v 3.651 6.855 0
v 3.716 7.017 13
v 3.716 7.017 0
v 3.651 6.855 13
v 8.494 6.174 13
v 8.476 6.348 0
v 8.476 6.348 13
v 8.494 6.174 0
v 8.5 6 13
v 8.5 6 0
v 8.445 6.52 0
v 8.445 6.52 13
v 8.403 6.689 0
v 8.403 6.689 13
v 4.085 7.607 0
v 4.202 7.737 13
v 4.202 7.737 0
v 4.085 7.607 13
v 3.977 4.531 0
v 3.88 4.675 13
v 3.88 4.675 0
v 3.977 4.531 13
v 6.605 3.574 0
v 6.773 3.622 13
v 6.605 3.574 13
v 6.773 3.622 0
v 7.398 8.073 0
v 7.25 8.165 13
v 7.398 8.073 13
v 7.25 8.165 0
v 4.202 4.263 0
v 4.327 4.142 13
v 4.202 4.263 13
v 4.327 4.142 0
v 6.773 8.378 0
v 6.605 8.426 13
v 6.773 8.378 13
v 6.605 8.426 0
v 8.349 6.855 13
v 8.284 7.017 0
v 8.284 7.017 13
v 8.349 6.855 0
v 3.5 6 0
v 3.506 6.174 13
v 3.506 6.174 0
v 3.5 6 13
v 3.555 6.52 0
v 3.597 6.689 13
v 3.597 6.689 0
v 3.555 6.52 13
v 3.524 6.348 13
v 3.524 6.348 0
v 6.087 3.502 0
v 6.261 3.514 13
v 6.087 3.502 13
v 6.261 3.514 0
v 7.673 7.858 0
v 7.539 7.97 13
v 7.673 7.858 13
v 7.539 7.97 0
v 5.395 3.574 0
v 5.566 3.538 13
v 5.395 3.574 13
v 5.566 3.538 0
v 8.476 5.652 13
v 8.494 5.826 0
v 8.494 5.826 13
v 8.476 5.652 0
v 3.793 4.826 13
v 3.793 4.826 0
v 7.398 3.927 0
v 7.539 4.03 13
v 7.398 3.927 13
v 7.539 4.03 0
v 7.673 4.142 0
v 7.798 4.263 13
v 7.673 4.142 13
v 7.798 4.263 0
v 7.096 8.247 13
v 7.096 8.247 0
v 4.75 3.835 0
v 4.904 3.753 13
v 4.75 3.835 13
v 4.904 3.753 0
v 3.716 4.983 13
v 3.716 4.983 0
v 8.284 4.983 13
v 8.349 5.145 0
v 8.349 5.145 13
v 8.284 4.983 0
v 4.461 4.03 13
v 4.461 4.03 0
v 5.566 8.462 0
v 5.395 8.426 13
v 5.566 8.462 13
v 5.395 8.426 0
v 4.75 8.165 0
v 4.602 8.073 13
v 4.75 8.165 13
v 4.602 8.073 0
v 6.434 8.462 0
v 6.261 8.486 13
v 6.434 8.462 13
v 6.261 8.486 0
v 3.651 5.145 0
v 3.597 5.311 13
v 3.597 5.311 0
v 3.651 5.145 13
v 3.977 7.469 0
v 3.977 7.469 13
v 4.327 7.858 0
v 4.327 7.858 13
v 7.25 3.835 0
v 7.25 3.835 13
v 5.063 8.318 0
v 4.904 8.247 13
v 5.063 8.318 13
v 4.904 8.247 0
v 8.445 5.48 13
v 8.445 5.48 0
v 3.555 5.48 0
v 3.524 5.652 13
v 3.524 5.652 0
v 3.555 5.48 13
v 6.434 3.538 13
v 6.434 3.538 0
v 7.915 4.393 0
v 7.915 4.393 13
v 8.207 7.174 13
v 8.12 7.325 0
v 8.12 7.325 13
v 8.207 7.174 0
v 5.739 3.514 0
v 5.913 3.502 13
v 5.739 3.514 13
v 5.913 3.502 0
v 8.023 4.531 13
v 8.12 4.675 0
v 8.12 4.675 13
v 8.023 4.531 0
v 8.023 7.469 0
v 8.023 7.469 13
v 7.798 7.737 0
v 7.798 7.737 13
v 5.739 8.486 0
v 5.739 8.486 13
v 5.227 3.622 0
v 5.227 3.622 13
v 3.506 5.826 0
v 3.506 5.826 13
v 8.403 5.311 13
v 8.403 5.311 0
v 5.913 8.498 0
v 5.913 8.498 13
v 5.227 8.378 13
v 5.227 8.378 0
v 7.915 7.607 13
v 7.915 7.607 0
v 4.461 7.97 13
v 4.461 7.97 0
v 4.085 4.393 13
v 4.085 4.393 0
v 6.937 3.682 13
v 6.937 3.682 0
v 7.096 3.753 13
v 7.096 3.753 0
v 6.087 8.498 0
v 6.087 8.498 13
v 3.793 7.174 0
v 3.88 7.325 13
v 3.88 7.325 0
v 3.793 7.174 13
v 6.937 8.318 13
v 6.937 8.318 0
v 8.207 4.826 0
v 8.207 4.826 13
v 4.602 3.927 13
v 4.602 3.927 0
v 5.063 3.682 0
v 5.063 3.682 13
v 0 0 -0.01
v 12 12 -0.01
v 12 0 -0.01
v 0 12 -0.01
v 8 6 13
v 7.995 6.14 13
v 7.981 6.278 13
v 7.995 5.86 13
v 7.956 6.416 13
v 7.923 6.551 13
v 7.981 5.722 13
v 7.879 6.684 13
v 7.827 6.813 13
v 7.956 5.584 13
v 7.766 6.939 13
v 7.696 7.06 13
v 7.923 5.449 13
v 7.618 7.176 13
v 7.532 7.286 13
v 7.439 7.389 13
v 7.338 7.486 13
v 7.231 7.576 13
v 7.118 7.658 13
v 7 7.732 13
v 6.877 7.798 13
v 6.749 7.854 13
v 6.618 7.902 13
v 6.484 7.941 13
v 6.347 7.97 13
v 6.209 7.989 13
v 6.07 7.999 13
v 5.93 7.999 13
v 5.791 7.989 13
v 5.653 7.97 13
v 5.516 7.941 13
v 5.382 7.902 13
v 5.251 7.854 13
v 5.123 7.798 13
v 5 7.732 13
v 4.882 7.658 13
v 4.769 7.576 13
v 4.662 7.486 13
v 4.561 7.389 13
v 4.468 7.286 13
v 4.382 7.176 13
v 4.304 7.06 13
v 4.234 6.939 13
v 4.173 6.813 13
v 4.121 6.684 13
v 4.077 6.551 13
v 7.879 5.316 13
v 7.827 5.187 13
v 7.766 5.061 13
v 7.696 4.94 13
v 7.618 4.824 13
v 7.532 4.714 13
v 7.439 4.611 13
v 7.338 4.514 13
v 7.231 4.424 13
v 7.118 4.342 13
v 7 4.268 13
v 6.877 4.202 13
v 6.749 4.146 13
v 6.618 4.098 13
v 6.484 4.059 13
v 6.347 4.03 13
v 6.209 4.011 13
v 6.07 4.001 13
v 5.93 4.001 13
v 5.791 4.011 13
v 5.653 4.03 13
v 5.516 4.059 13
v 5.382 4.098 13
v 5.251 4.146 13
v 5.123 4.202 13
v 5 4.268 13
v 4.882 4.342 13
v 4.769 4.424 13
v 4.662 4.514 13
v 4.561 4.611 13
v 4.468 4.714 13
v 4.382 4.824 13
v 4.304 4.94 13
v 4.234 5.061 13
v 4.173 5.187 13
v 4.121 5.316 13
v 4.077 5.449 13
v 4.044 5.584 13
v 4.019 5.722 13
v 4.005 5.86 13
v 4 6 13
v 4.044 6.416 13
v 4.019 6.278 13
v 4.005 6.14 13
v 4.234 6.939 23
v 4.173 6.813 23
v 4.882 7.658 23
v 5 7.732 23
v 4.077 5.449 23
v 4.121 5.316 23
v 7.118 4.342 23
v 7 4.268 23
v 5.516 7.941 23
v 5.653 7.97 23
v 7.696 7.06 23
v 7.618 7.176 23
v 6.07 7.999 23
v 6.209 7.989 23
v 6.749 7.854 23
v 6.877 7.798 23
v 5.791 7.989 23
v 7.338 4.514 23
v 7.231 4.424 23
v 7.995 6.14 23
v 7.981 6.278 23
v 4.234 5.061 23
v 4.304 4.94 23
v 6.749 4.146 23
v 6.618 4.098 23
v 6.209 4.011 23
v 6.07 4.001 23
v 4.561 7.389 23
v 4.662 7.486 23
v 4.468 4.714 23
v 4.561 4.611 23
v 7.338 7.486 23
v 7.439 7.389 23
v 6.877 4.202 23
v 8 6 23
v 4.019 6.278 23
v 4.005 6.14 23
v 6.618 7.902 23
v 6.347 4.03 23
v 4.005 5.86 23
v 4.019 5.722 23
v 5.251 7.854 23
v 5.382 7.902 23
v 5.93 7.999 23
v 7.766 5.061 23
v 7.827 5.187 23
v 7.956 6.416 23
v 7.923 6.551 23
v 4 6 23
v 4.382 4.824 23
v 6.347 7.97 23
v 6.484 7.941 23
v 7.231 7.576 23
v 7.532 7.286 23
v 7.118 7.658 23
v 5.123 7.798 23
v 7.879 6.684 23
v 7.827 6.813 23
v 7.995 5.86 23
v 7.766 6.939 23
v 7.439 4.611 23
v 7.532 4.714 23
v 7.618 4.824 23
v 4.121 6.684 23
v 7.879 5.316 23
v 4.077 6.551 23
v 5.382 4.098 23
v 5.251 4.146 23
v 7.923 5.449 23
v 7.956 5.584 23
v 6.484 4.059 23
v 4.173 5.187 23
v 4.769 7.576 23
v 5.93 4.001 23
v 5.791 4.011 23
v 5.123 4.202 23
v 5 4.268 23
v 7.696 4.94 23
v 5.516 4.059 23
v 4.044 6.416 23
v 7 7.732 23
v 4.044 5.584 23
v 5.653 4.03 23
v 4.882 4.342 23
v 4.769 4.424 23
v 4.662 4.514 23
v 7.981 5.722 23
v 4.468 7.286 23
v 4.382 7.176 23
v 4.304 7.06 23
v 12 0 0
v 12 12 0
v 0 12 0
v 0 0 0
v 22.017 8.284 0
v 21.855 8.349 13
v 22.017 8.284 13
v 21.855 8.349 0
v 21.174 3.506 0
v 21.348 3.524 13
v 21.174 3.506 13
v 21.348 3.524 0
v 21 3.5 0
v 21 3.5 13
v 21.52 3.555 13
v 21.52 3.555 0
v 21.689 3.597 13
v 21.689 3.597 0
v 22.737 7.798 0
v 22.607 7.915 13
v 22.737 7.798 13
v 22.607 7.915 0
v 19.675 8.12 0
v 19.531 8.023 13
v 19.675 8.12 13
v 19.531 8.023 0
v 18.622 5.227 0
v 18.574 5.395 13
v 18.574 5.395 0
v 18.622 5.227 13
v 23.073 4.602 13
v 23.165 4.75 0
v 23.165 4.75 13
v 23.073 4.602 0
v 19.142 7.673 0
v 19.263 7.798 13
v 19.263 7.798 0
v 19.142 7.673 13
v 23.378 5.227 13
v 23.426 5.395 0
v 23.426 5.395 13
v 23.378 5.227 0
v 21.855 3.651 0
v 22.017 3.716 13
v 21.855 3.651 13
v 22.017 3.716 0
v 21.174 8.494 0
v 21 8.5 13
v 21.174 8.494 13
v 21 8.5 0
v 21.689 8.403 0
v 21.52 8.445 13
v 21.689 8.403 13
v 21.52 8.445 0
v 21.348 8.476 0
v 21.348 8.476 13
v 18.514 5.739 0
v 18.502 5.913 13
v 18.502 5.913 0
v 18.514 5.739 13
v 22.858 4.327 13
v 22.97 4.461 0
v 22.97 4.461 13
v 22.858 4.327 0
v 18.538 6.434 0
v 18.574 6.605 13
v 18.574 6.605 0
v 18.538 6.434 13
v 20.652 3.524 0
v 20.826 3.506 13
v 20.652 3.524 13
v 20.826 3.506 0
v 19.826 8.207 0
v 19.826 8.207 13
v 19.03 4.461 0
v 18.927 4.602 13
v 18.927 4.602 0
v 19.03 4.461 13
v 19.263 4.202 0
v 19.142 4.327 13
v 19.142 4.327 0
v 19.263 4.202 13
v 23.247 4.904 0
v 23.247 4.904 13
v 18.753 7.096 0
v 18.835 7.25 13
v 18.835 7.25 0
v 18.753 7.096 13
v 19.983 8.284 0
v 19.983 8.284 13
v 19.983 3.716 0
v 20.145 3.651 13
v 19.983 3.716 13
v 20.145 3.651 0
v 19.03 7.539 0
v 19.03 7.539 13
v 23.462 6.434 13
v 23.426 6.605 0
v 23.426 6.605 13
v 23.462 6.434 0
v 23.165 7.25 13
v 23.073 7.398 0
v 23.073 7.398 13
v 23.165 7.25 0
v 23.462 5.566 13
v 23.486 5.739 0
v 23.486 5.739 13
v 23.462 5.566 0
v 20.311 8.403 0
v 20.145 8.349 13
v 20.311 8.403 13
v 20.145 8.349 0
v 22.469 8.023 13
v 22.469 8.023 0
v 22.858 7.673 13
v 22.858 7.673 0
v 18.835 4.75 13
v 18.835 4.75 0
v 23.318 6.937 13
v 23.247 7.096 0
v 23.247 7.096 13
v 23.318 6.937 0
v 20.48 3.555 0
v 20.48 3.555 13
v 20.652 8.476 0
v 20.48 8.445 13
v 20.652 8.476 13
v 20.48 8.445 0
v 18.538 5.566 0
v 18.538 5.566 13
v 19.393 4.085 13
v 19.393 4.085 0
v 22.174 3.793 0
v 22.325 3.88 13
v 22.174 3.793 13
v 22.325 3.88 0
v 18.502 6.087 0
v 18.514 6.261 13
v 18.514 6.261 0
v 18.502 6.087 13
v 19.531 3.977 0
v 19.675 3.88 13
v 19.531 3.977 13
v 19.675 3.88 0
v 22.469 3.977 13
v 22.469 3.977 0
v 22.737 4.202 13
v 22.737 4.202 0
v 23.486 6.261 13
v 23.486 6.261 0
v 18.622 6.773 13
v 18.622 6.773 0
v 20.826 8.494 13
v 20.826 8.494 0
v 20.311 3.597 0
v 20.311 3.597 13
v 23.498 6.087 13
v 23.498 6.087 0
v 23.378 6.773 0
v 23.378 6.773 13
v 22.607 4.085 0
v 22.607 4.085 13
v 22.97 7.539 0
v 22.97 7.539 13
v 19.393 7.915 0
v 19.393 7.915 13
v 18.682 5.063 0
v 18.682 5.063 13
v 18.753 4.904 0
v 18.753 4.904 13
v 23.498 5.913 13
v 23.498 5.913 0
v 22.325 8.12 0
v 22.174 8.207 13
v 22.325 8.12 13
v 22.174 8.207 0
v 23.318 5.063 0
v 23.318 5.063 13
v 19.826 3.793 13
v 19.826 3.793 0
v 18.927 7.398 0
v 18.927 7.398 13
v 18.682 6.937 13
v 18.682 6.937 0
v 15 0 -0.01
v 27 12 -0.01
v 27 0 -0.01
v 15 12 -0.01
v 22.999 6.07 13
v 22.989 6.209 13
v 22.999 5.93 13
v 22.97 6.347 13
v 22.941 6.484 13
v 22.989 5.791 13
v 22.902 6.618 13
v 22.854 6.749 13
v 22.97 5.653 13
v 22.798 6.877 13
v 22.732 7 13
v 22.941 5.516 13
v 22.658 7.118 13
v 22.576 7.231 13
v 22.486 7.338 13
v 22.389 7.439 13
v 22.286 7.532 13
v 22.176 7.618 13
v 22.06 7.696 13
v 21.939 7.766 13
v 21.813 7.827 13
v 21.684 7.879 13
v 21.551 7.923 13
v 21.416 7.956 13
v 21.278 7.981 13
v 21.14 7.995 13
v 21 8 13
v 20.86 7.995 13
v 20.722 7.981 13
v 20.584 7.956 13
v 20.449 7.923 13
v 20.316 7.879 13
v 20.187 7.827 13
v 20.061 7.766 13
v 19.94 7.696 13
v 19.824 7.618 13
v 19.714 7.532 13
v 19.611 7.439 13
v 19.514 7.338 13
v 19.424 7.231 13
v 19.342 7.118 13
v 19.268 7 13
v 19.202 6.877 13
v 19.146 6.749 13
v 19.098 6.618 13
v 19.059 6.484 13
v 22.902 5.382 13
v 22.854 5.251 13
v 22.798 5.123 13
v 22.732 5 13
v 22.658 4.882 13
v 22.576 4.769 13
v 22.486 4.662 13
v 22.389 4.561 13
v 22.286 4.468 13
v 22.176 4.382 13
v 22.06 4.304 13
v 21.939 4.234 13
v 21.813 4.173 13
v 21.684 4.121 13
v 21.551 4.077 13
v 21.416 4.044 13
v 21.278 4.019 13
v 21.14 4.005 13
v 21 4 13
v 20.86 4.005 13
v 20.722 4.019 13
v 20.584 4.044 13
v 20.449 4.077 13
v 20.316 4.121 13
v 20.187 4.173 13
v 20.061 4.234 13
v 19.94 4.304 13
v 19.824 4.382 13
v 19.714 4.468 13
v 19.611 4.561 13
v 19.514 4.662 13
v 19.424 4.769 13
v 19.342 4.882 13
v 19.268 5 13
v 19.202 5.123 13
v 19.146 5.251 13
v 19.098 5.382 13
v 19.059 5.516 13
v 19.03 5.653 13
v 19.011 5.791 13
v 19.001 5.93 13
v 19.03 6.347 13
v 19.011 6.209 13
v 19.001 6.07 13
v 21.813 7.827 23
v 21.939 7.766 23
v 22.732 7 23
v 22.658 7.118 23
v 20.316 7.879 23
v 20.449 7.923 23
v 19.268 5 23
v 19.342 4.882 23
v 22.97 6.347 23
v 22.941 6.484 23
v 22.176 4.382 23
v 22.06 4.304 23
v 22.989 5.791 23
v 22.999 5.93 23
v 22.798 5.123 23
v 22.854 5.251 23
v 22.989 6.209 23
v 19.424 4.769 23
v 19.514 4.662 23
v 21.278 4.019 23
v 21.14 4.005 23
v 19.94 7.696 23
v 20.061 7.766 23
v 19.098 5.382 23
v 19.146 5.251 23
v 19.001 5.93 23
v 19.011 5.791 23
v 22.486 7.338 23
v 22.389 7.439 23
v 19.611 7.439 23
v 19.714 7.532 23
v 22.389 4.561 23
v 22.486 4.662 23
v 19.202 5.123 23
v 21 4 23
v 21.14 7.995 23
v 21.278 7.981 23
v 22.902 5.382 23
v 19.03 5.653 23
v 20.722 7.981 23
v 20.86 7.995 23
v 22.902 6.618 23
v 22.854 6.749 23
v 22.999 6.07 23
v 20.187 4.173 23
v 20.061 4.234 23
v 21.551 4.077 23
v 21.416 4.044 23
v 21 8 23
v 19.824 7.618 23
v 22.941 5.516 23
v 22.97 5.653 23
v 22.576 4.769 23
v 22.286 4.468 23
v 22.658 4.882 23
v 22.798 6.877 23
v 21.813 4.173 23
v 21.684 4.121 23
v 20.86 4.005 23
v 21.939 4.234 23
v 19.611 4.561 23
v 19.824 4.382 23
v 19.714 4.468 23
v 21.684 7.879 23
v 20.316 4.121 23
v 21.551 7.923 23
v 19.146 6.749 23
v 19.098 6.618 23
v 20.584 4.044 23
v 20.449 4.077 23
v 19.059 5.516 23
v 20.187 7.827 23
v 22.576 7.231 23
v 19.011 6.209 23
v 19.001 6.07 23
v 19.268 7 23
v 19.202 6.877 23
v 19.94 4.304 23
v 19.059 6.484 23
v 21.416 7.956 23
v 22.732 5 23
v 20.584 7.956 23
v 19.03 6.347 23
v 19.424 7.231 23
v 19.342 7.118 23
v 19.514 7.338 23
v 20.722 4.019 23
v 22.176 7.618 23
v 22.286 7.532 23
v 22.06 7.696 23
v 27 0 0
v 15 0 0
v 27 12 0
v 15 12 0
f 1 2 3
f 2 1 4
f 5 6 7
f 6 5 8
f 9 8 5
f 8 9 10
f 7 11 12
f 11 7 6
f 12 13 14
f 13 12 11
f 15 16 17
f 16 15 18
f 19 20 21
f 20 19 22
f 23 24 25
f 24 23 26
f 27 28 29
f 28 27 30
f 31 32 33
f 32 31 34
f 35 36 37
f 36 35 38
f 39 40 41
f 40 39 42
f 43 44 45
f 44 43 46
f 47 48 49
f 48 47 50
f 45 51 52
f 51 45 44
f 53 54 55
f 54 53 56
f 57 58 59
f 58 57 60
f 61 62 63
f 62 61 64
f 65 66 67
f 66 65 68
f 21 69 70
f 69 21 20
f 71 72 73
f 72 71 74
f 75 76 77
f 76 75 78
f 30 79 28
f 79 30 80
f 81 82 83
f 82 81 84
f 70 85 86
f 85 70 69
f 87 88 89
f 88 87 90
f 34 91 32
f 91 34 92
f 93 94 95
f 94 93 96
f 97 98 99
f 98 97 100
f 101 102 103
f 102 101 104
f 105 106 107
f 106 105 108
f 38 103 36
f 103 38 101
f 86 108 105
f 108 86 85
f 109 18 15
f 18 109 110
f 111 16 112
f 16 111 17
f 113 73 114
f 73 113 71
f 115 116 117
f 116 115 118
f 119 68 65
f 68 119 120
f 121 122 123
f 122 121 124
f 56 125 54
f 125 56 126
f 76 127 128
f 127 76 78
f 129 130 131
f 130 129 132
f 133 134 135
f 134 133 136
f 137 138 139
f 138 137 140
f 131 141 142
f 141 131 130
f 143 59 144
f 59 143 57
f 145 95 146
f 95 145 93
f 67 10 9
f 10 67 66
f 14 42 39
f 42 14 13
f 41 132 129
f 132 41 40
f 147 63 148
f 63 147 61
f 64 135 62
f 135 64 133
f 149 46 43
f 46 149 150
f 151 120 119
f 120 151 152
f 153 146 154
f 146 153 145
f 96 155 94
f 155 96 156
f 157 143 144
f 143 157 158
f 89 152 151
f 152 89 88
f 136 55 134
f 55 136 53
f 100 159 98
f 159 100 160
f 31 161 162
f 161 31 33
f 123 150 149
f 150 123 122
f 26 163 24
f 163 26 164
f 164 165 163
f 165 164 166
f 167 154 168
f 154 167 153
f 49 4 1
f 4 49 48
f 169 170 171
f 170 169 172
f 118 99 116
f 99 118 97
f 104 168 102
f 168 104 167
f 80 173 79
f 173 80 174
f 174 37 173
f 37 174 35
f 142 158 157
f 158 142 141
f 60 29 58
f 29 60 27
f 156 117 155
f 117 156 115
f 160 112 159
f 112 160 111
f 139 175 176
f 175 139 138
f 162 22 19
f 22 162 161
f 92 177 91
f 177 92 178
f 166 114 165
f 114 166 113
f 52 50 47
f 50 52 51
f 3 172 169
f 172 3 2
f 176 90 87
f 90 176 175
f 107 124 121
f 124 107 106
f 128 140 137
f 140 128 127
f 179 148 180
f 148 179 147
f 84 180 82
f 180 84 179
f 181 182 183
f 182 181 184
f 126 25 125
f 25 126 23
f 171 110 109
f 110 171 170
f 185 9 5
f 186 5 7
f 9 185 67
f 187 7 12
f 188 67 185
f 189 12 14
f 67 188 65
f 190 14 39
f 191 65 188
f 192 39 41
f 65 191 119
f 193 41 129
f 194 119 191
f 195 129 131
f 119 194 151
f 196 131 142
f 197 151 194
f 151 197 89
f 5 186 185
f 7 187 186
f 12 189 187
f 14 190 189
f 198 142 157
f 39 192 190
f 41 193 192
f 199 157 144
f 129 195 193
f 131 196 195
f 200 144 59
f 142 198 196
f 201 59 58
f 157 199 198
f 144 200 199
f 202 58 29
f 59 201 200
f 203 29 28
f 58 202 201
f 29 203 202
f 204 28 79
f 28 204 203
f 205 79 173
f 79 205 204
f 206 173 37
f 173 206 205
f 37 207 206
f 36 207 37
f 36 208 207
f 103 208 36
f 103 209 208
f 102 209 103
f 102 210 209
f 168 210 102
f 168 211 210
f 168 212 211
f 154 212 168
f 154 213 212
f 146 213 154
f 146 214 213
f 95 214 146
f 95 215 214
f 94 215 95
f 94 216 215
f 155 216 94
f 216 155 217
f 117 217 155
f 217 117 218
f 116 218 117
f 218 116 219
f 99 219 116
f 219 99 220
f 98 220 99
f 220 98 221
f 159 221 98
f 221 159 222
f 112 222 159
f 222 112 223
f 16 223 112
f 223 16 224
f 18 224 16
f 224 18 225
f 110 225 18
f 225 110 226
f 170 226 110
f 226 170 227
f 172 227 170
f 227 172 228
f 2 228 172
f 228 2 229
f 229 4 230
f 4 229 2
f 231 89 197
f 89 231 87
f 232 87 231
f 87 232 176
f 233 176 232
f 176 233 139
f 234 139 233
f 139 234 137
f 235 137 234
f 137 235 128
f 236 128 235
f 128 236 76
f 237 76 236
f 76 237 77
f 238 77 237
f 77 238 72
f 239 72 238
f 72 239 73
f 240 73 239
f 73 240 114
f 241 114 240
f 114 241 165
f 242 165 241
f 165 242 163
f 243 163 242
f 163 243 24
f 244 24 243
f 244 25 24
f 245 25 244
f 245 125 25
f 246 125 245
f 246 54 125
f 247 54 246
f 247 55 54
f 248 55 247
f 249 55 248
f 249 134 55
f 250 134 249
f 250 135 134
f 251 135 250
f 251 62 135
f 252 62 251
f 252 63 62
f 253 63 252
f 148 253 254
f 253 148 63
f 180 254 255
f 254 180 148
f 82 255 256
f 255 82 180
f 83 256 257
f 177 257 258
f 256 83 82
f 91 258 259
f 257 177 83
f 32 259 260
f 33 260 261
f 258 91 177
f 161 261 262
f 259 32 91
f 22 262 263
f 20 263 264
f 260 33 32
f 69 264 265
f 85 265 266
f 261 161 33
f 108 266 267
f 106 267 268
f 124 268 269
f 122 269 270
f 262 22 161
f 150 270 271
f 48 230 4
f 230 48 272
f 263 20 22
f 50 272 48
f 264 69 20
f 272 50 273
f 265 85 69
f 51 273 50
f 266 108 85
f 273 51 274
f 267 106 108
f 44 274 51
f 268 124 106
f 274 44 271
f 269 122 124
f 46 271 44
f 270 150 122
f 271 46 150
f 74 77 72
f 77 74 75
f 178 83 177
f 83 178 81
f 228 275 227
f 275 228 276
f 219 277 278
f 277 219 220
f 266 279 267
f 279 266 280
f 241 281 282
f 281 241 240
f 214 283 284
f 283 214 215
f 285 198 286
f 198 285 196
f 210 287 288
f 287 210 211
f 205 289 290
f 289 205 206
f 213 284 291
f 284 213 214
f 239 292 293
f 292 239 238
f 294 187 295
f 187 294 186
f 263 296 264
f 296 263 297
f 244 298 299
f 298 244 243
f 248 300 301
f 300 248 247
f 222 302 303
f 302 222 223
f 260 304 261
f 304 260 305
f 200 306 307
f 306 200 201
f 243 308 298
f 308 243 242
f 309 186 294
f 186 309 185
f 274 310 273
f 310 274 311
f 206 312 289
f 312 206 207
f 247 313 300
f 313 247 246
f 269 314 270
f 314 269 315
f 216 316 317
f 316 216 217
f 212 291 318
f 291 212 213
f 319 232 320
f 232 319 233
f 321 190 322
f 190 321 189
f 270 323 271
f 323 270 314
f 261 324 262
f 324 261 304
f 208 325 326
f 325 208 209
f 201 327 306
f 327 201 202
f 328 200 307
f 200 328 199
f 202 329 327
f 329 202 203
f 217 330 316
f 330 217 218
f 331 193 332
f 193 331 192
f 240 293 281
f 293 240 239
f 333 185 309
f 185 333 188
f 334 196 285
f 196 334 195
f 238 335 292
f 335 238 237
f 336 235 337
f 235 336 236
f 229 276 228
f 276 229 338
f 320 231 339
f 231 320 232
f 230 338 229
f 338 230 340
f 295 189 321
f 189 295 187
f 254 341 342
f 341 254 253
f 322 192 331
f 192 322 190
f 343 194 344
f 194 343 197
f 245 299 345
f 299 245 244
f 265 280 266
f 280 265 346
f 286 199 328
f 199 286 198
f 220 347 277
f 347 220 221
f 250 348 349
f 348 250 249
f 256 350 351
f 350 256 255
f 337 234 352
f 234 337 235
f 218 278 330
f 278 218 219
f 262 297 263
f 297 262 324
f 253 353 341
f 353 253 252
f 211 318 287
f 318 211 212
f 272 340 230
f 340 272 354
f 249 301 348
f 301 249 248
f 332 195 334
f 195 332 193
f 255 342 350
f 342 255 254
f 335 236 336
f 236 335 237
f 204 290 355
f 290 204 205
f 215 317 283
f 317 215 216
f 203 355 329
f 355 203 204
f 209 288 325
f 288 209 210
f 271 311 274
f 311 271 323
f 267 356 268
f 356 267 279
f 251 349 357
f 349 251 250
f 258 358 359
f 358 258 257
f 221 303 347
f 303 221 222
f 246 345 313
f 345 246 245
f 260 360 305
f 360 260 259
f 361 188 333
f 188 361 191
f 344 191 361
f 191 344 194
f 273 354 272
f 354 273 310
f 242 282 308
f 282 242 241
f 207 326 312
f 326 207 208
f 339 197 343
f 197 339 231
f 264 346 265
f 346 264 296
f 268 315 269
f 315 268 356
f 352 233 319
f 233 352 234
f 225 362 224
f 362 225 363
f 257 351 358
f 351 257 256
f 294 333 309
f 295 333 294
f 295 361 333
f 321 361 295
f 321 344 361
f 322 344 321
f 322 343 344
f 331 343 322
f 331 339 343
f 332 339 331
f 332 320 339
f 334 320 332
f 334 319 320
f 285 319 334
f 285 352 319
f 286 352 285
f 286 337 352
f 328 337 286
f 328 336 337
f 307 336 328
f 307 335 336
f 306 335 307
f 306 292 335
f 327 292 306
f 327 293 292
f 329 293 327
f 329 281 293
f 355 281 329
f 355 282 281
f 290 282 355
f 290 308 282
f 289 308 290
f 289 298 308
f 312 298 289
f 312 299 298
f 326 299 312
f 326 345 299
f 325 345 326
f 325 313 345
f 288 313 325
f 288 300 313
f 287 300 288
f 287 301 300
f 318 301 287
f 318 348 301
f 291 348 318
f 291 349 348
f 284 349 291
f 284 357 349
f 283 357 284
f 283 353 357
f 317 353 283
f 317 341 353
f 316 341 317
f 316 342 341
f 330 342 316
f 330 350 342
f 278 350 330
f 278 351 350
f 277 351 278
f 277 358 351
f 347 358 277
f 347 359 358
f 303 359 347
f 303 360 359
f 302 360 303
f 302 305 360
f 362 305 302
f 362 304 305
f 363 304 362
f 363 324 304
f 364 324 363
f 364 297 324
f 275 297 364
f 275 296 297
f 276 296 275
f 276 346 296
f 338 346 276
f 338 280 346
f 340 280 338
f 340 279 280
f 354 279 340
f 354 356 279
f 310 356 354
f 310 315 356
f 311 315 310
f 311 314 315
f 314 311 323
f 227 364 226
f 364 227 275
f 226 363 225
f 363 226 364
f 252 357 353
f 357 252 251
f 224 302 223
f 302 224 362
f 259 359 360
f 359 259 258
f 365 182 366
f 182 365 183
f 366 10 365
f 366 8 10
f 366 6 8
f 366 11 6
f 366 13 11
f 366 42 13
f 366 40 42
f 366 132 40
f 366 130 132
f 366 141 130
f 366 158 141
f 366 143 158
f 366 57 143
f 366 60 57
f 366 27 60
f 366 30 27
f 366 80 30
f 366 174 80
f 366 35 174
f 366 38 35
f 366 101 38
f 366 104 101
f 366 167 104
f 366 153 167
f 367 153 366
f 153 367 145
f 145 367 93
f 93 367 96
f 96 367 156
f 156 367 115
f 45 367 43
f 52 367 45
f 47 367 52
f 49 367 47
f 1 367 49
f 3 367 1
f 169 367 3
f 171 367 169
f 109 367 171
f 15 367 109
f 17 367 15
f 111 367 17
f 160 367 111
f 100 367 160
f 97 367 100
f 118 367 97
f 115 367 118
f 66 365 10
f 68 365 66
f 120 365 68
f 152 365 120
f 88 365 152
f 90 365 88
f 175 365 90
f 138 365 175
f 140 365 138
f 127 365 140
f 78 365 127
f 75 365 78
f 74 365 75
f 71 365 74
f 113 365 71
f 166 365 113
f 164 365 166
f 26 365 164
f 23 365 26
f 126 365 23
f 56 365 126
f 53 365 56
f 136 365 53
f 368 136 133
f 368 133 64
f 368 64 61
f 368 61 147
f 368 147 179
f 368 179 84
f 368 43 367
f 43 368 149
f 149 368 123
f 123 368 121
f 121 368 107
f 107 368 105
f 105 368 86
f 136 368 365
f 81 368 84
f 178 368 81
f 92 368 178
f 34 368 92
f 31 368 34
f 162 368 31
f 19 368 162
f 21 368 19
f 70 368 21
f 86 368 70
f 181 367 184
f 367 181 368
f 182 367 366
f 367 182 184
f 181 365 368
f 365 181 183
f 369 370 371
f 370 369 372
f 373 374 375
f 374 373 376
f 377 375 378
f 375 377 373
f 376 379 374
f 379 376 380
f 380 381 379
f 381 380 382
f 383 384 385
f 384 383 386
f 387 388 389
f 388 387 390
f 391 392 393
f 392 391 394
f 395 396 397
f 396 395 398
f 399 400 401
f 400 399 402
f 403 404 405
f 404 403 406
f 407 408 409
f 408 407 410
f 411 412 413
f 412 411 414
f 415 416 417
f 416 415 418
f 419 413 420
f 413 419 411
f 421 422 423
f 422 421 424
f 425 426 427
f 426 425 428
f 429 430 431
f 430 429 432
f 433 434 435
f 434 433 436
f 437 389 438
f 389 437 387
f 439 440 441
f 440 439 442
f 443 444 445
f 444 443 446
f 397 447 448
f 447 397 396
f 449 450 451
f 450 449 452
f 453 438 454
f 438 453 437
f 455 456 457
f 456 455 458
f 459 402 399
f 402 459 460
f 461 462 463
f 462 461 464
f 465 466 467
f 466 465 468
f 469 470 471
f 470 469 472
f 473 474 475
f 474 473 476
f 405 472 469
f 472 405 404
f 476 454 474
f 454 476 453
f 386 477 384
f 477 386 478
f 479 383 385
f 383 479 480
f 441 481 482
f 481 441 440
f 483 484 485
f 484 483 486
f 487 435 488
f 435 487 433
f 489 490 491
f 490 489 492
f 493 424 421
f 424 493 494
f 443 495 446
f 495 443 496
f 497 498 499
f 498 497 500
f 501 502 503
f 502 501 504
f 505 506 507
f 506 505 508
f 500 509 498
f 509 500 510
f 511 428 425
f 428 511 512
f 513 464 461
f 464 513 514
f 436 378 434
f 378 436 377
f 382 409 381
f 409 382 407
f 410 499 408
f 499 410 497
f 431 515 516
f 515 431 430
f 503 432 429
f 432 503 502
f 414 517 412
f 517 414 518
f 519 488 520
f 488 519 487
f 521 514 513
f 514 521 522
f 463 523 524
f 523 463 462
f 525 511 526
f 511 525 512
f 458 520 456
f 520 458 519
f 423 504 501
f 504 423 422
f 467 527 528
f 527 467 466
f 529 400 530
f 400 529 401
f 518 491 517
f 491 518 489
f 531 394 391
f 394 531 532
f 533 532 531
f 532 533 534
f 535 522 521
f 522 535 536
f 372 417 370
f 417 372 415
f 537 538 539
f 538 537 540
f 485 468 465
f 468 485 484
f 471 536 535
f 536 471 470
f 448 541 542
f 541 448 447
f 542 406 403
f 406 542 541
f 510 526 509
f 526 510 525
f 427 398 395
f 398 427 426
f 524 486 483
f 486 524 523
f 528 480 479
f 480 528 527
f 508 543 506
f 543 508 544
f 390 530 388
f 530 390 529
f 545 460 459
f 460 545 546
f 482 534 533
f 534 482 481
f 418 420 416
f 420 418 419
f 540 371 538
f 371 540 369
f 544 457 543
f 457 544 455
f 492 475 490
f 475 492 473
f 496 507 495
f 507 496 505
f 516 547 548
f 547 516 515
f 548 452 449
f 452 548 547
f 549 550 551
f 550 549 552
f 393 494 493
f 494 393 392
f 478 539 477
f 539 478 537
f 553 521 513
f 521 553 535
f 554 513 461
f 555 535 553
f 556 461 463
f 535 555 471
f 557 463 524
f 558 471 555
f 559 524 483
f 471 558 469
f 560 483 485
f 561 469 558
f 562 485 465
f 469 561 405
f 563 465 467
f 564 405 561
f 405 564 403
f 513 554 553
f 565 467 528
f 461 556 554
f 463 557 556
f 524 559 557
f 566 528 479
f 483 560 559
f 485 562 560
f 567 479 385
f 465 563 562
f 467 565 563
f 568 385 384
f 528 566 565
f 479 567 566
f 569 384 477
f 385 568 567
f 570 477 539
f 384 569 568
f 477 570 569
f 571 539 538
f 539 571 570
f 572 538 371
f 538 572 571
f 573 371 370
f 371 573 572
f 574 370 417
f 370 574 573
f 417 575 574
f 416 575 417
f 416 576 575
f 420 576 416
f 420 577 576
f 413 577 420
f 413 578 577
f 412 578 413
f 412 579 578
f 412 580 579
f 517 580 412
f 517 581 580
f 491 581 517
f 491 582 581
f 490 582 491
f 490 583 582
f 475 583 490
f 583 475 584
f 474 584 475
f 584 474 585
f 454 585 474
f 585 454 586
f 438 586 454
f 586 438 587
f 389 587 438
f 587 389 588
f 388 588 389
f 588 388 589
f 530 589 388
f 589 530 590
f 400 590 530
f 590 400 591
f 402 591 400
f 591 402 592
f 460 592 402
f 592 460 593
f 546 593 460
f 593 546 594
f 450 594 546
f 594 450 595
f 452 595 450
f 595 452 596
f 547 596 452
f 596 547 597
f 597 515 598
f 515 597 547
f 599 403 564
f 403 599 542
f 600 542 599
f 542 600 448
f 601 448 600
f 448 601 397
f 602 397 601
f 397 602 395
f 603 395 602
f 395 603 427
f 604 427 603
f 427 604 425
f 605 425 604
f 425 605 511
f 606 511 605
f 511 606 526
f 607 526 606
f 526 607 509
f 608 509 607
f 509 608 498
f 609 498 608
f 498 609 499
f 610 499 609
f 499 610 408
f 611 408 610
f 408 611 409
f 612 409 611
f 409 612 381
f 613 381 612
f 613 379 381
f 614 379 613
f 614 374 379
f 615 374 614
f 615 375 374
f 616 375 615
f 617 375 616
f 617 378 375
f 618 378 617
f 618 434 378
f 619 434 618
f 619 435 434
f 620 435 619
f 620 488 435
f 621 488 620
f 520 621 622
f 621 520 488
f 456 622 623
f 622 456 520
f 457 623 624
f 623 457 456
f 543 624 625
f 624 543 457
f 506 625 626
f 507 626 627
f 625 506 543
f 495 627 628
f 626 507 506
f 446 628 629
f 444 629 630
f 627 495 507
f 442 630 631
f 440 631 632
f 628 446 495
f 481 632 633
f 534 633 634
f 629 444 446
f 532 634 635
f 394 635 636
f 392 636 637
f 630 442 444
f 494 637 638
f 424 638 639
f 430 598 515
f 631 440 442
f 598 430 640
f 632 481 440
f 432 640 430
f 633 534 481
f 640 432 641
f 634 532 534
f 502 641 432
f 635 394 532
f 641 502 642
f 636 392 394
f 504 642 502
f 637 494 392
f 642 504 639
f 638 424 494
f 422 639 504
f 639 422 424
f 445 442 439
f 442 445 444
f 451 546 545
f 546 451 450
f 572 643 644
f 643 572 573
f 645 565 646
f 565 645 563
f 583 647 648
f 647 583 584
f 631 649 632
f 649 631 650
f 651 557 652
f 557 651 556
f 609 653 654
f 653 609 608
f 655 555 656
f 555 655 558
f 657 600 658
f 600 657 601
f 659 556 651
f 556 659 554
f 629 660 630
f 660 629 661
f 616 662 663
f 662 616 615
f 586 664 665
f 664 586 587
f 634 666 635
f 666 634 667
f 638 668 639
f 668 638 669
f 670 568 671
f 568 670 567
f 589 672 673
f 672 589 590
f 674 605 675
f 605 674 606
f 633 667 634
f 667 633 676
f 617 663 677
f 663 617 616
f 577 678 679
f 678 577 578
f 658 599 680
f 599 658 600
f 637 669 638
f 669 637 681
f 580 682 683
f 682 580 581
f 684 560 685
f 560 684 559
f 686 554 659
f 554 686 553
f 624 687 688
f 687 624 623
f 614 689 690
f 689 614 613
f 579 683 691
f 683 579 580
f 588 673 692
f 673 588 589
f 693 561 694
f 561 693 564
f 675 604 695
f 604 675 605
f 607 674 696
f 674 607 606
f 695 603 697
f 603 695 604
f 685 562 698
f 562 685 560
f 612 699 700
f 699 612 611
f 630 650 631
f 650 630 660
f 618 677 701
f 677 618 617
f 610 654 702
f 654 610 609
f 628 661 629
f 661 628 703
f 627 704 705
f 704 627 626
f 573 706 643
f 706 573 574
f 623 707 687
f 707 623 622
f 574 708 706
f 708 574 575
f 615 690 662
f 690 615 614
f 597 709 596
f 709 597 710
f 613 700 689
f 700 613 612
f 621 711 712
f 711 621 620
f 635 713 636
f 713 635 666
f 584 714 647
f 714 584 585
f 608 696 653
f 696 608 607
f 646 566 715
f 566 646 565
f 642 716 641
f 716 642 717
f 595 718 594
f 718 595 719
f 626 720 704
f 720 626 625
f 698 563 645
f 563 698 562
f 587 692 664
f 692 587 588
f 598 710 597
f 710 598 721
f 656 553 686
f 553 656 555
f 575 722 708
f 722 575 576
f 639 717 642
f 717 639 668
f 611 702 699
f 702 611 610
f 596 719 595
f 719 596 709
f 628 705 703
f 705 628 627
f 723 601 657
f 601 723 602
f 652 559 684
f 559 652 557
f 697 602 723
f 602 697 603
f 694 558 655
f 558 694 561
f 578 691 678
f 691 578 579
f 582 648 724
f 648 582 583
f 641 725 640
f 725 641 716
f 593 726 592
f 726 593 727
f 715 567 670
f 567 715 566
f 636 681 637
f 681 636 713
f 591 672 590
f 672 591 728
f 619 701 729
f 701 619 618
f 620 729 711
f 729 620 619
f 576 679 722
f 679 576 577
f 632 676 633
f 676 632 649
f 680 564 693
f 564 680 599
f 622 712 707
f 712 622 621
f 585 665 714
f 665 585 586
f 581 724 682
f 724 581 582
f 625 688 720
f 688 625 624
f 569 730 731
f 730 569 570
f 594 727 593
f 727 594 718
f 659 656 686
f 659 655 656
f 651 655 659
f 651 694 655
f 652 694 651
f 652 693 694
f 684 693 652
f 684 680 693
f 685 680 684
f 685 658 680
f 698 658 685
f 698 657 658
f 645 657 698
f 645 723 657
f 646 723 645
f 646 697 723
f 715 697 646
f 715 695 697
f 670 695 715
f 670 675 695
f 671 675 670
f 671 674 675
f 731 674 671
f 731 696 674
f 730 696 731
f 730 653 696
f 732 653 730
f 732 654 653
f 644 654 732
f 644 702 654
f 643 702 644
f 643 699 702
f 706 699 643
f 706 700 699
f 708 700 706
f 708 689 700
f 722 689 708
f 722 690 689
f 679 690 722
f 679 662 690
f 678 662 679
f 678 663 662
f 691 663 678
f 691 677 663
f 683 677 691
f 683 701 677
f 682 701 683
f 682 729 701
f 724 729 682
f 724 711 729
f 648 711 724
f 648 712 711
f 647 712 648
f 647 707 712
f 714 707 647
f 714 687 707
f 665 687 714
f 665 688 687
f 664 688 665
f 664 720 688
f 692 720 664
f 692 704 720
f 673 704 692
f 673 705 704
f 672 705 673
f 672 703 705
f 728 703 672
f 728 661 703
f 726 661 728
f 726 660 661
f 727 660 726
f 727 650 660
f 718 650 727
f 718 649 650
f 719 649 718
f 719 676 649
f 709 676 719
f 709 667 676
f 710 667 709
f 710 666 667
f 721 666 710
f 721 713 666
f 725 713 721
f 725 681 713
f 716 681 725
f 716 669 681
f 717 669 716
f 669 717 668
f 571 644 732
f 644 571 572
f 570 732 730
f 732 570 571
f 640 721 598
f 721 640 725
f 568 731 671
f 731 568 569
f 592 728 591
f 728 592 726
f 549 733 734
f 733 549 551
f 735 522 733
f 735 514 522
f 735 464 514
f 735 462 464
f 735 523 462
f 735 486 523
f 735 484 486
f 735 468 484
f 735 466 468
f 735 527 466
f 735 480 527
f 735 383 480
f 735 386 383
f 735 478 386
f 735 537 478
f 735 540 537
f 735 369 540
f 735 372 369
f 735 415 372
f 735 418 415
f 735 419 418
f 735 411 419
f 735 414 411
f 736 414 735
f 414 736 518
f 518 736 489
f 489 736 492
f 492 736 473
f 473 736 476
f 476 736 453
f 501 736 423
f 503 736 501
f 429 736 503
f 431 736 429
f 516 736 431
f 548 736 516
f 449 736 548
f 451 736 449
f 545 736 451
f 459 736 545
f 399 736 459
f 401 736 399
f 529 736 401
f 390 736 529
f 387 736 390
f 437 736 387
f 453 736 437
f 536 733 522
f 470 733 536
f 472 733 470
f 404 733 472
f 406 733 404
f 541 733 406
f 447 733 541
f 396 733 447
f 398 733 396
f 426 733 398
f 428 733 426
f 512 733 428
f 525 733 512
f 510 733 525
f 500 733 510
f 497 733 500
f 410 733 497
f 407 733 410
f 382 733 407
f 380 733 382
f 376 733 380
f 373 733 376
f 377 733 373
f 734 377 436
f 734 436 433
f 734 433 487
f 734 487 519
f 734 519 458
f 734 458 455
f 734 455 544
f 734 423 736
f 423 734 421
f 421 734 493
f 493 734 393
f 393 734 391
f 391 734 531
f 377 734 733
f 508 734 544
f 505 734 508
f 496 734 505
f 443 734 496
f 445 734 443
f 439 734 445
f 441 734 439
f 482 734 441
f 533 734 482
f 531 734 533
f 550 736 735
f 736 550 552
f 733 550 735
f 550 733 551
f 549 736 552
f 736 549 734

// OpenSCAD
// file: ../../Base/Boxes.scad
// Fischertechnik Box Foundation
// Pre-designed Boxes

use <Constants.scad>

include <PlacementOptions.scad>

box190Width = 190;
box190Depth = 130;
box130Width = 130;
box130Depth = 95;
boxUsageHeight = 33.9;
boxWallThickness = 2.4;
boxBaseThickness = 1.0;
boxWebWidth = 3.0;

// getBoxWallThickness()
// Gets the wall thickness of a Fischertechnik Box

function getBoxWallThickness() = boxWallThickness;

// Gets the usable height of a fischertechnik box
function getBoxUsageHeight() = boxUsageHeight;

// Gets the thickness of the Fischertechnik box base.
function getBoxBaseThickness() = boxBaseThickness;

// Gets the width of a box web
function getBoxWebWidth() = boxWebWidth;

// Gets the usable inner space of a Box 190 as an x/y-list
function getBox190Space() = [
    box190Width - 2*getBoxWallThickness(), 
    box190Depth - 2*getBoxWallThickness() ];

// Imports the Fischertechnik empty box 130x190 mm and places it at position 0,0
// 190x130 are the outer sizes, the inner space is slightly smaller. Use getBox190Space() to get the inner sizes.
// This module needs the STL file "Fischertechnik Box 130x190.stl" in the library path.
// The box is positioned that the usable inner space is at the 0,0,0 position. The

module Box190() {
    translate([-getBoxWallThickness(),-getBoxWallThickness(),-getBoxBaseThickness()])
        import("Fischertechnik Box 130x190.stl", convexity=3);
}

// Gets the usable inner space of a Box 130 as an x/y-list
function getBox130Space() = [
    box130Width - 2*getBoxWallThickness(), 
    box130Depth - 2*getBoxWallThickness() ];

// Imports the Fischertechnik empty box 95x130 mm and places it at position 0,0
// 190x130 are the outer sizes, the inner space is slightly smaller. Use getBox190Space() to get the inner sizes.
// This module needs the STL file "Fischertechnik Box 95x130.stl" in the library path.
// The box is positioned that the usable inner space is at the 0,0,0 position. The

module Box130() {
    translate([-getBoxWallThickness(),-getBoxWallThickness(),-getBoxBaseThickness()])
        import("Fischertechnik Box 95x130.stl", convexity=3);
}

// Creates a web at the specified box walls
// corner 0 = LowerLeft, 1 = UpperLeft, 2 = UpperRight, 3 = LowerRight
// side 0 = LeftOfCorner, 1 = RightOfCorner
// distance = Distance in mm from the corner
// box = inner width and depth of the box (default: Box 190)
// webWidth = length of the web (default is 3 mms)
// webThickness = thickness of the web (default is 1 mm)

module BoxWeb(corner, side, distance, box=getBox190Space(), webWidth=getBoxWebWidth(), webThickness=1.0) {
    sink = getBoxWallThickness()/2;

    width = (corner % 2 == 0) ? 
            (side == LeftOfCorner ? webWidth : webThickness) :
            (side == LeftOfCorner ? webThickness : webWidth);

    depth = (corner % 2 == 0) ? 
            (side == RightOfCorner ? webWidth : webThickness) :
            (side == RightOfCorner ? webThickness : webWidth);
    
    xDiff = corner == LowerLeft ? 
                (side == LeftOfCorner ? -sink : distance) :
            (corner == UpperLeft ?                
                (side == LeftOfCorner ? distance : -sink) :
            (corner == UpperRight ?
                (side == LeftOfCorner ? box.x-webWidth+sink : box.x-distance-webThickness) :
                (side == LeftOfCorner ? box.x-distance-webThickness: box.x-webWidth+sink)));

    yDiff = corner == LowerLeft ? 
                (side == RightOfCorner ? -sink : distance) :
            (corner == UpperLeft ?
                (side == RightOfCorner ? box.y-distance : box.y-webWidth+sink) :
            (corner == UpperRight ?
                (side == RightOfCorner ? box.y-webWidth+sink : box.y-distance) :
                (side == RightOfCorner ? distance : -sink)));
    
    translate([xDiff, yDiff, -getExcess()])
        cube([width, depth, boxUsageHeight + 2*getExcess()]);
}
// file: ../../Base/Rotation.scad
// Fischertechnik Box Foundation
// Geometry Helpers Rotation

include <PlacementOptions.scad>

// getRotatedSpace(space, rotation=NoRotation)
// Rotates the space dependent on the specified rotation

function getRotatedSpace(space, rotation=NoRotation) = [
    (rotation == Rotate90 || rotation == Rotate270) ? space.y : space.x,
    (rotation == Rotate90 || rotation == Rotate270) ? space.x : space.y
];

// Rotates the given space around the fixed left lower corner
// space = the space the children needs as width/depth list [width,depth]
// rotation = 0 Rotate0 degrees, 1 Rotate90 degrees, 2 Rotate180 degrees, 3 Rotate270 degrees (equivalent to -90)

module RotateFix(space, rotation=Rotate0) {
    dy = (rotation == Rotate0 || rotation == Rotate270) ? 0 :
        (rotation == Rotate90) ? space.x :
        space.y;
    dx = (rotation < Rotate180) ? 0 :
        (rotation == Rotate180) ? space.x :
        space.y;
    
    translate([dx, dy, 0])
        rotate([0, 0, rotations[rotation]])
            children();
}
// file: ../../Base/Alignment.scad
// Fischertechnik Box Foundation
// Geometry Helpers Alignment

include <PlacementOptions.scad>

// getAlignedX(elementWidth, spaceWidth, align=AlignRight, offset=0)
// Gets the aligned X offset of an element with the given
// width in the given space.
// elementWidth = The width of the element to positon
// spaceWidth = The space where the element should be aligned
// align = 0 AlignLeft, 1 AlignCenter, 2 AlignRight
// offset = an optional offset from the aligned position. When
// aligned left or centered, then positive values are in X direction.
// When aligned right then positive values are in negative X direction.

function getAlignedX(elementWidth, spaceWidth, align=AlignRight, offset=0) =
    (align == AlignLeft) ?
        offset :
        ((align == AlignCenter) ?
        (spaceWidth - elementWidth)/2 + offset :
        spaceWidth - offset - elementWidth);

// getAlignedY(elementDepth, spaceDepth, align=AlignTop, offset=0)
// Gets the aligned Y offset of an element with the given
// depth in the given space.
// elementDepth = The depth of the element to positon
// spaceDepth = The space where the element should be aligned
// align = 0 AlignBottom, 1 AlignCenter, 2 AlignTop
// offset = an optional offset from the aligned position. When
// aligned bottom or centered, then positive values are in Y direction.
// When aligned top then positive values are in negative Y direction.

function getAlignedY(elementDepth, spaceDepth, align=AlignTop, offset=0) =
    (align == AlignBottom) ?
        offset :
        ((align == AlignCenter) ?
        (spaceDepth - elementDepth)/2 + offset :
        spaceDepth - offset - elementDepth);
// file: ../../Base/Constants.scad
// Fischertechnik Box Foundation
// Constants

// Constant values necessary for multiple elements

// Base constants
dividerThickness = 1.2;
excess = 0.01;
fragments = 90;
tolerance = 0.8;

// Gets the thickness of a divider 
function getDividerThickness() = dividerThickness;

// Gets the excess that is used to merge walls into each other
function getExcess() = excess;

// Gets amount of fragments of a cylinder
function getFragments() = fragments;

// Gets the inner tolerance of a frame to each side
function getTolerance() = tolerance;


// Fischertechnik specific constants
axisDiameter = 4;
axisBottomDiameter = axisDiameter + 1;
standardEdgeDistance = 2.5;
standardWebDistance = 11.5;
standardCornerLength = 15;
tubeWallFactor = 0.8;

// Gets axis diameter
function getAxisDiameter() = axisDiameter;

// Gets axis bottom diameter for thicker part at the bottom
function getAxisBottomDiameter() = axisBottomDiameter;

// gets the standard distance to the wall of the box for dockable frames with webs
function getStandardEdgeDistance() = standardEdgeDistance;

// gets the standard distance of each web to the corner of the dockable frame
function getStandardWebDistance() = standardWebDistance;

// gets the standard length of the corner walls of a dockable frame
function getStandardCornerLength() = standardCornerLength;

// gets the wall thickness of a tube.
function getTubeWallThickness() = tubeWallFactor * getDividerThickness();
// file: ../../Base/PlacementOptions.scad
// Fischertechnik Box Foundation
// Placement Options

// Alignment
NoAlign = 0;
AlignLeft = 1;
AlignBottom = 2;
AlignCenter = 3;
AlignRight = 4;
AlignTop = 5;

// Element rotation degree steps
rotations = [0, -90, -180, -270];

// Rotation
NoRotation = 0;
Rotate0 = 0;
Rotate90 = 1;
Rotate180 = 2;
Rotate270 = 3;

// Docking (seen from above)
NoDock = -1;
DockLeft = 0;
DockTop = 1;
DockRight = 2;
DockCorner = 2;
DockBottom = 3;

// Web corners
LowerLeft = 0;
UpperLeft = 1;
UpperRight = 2;
LowerRight = 3;

// Web position relative to corner
LeftOfCorner = 0;
RightOfCorner = 1;
// file: ../../Elements/AxisClip10.scad
// Fischertechnik Box Library
// Axis for clip 10
// 31023

use <../ModelBase/Simple.scad>

width = 12;
depth = 12;
height = 23;

// getAxisClip10Space()
// Gets the space of a frame for a clip 10 with spring ring (mot2)

function getAxisClip10Space() = [width, depth, height];

// AxisClip10()
// Axis for clip 10 with spring ring (mot2)

module AxisClip10() {
    LeveledAxisWithSpace(height, height-10, getAxisClip10Space());
}

// Tests
color("lightgray")
AxisClip10();
// file: ../../Base/Placement.scad
// Fischertechnik Box Foundation
// Geometry Helpers Placement

use <Constants.scad>
use <Alignment.scad>
use <Rotation.scad>
use <Boxes.scad>

include <PlacementOptions.scad>

// Place(x=0, y=0, elementSpace=[0,0], alignX=AlignLeft, alignY=AlignBottom, rotation=Rotate0, boxSpace=getBox190Space())
// Places the child at the specified position
// y = Y-Position. This is a relative position when an X aligment is specified.
// x = X-Position. This is a relative position when an Y aligment is specified.
// elementSpace = space of the element to be placed [x,y]
// alignX = -1=NoAlign, 0 AlignLeft, 1 AlignCenter, 3 AlignRight (elementSpace and boxSpace required!)
// alignY = -1=NoAlign, 2 AlignBottom, 1 AlignCenter, 4 AlignTop (elementSpace and boxSpace required!)
// rotation = 0 Rotate0 0 degrees, 1 Rotate90 90 degrees, 
// 2 Rotate180 180 degrees, 3 Rotate270 270 degrees (equivalent to -90)
// boxSpace = Inner space of the box where the placement occurs [x,y] - default is Box 190x130 inner space

module Place(x=0, y=0, elementSpace=[0,0], 
  alignX=AlignLeft, alignY=AlignBottom, 
  rotation=NoRotation, boxSpace=getBox190Space()) {

    module Position(x, y, space, rotation=Rotate0) {
        translate([x, y, 0])
            RotateFix(space, rotation)
                children();
    }

    space = getRotatedSpace(elementSpace, rotation);
    alignedX = getAlignedX(space.x, boxSpace.x, alignX, x);
    alignedY = getAlignedY(space.y, boxSpace.y, alignY, y);
    Position(alignedX, alignedY, elementSpace, rotation)
        children();
}

// Center(space=getBox130Space(), elementSpace=[0,0])
// space = Space where the children is centered. For cylinder use centered=true and no elementSpace.
// elementSpace = space of the element to be centered [x,y]

module Center(space=getBox190Space(), elementSpace=[0,0]) {
    translate([(space.x - elementSpace.x) / 2, (space.y - elementSpace.y) / 2])
        children(0);
}

// CenterHorizontal(width=0, y=0, offset=0, space=getBox130Space())
// space = Space where the children is centered. For cylinder use centered=true and no elementSpace.
// elementSpace = space of the element to be centered [x,y]

module CenterHorizontal(width=0, y=0, offset=0, space=getBox190Space()) {
    translate([(space.x - width) / 2 + offset, y])
        children(0);
}

// CenterVertical(depth=0, x=0, offset=0, space=getBox130Space())
// space = Space where the children is centered. For cylinder use centered=true and no elementSpace.
// elementSpace = space of the element to be centered [x,y]

module CenterVertical(depth=0, x=0, offset=0, space=getBox190Space()) {
    translate([x, (space.y - depth) / 2 + offset])
        children(0);
}
// main file
// Fischertechnik Box Foundation
// Elements
// Test AxisClip10

use <../../Base/Placement.scad>
use <../../Elements/AxisClip10.scad>

include <../../Base/PlacementOptions.scad>

AxisClip10();

Place(15, 0, getAxisClip10Space(), rotation=Rotate90)
    AxisClip10();
